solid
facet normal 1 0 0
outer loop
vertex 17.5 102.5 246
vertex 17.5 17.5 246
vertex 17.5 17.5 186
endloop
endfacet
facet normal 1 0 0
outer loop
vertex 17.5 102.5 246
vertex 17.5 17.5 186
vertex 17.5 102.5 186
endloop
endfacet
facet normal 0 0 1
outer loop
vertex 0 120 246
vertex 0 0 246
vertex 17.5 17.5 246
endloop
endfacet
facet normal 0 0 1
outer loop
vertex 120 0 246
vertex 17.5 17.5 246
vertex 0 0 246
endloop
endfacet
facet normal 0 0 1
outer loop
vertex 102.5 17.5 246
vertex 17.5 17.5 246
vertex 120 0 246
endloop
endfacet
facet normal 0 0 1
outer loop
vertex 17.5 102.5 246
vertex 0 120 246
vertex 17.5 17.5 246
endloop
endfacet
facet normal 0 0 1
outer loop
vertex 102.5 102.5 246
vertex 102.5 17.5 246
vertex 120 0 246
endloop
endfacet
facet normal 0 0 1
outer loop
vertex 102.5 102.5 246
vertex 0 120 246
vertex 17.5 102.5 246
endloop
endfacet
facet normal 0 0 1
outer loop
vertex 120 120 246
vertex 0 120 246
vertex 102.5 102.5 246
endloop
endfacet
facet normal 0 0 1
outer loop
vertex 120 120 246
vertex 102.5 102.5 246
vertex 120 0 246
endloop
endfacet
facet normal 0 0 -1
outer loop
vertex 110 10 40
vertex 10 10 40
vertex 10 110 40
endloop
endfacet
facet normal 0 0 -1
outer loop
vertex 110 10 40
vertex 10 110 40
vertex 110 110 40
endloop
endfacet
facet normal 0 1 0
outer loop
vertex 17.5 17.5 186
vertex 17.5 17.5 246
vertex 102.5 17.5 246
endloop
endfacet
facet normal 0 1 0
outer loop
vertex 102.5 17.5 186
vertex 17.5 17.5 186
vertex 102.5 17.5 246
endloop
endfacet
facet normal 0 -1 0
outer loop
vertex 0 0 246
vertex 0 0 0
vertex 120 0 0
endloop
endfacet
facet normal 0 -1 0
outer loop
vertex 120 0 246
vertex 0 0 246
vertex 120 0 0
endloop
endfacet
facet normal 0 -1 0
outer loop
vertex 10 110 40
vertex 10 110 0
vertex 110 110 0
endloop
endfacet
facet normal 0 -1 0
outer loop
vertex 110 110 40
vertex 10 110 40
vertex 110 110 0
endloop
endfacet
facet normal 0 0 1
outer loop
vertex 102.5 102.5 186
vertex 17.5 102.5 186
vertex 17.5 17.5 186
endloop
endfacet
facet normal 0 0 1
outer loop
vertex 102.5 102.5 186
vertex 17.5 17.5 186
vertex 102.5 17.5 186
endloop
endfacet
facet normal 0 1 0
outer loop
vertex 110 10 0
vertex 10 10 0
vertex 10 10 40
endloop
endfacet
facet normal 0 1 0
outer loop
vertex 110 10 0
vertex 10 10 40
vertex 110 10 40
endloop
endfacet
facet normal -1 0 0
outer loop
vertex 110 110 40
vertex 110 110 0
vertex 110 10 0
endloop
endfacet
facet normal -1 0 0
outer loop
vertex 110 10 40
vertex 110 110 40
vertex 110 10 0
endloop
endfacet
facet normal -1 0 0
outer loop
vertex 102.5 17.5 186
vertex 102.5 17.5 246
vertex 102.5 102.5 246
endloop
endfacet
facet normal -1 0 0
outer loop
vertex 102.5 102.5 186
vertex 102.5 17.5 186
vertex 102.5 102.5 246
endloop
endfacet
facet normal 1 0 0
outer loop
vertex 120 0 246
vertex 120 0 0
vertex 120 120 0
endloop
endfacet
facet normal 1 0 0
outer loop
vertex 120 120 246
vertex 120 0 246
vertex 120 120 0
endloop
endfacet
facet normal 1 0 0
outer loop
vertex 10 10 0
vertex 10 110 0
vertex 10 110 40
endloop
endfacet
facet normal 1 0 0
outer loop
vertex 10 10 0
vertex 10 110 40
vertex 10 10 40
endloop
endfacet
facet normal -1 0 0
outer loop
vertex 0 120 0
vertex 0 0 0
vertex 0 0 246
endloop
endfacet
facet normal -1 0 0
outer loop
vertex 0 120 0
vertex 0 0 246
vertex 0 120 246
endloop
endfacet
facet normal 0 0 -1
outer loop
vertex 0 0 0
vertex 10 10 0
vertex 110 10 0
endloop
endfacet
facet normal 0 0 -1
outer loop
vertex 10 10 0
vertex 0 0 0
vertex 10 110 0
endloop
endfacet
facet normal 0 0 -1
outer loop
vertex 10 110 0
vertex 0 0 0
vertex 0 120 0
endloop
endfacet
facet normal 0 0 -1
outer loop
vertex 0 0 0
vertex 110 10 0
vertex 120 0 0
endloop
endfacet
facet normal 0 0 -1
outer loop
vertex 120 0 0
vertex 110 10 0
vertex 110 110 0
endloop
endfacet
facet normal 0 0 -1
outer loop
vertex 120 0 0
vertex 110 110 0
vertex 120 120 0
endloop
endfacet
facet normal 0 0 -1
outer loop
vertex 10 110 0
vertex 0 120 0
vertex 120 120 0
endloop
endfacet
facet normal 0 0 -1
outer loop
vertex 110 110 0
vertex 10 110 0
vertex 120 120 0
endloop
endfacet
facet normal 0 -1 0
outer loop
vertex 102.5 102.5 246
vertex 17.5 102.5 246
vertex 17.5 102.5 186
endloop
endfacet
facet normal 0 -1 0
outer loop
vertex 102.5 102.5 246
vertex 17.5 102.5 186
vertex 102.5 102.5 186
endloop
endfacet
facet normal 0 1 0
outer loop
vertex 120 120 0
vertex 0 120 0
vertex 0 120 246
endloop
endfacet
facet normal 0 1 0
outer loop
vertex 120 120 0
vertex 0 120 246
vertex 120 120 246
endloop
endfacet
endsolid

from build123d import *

# Parameters (mm, degrees)
F0_W     = 120
F0_H     = 120
F1_DEPTH = 246
F2_W     = 100
F2_H     = 100
F3_DEPTH = 40
F4_W     = 85
F4_H     = 85
F5_DEPTH = 60


with BuildPart() as f1:
    # F0 (on Top) → F1 (new body)
    with BuildSketch(Plane.XY):
        with Locations((60, 60)):
            Rectangle(F0_W, F0_H)
    extrude(amount=F1_DEPTH)

    # F2 (on face) → F3 (cut)
    with BuildSketch(Plane(origin=(0, 0, 0), x_dir=(1, 0, 0), z_dir=(0, 0, -1))):
        with Locations((60, -60)):
            Rectangle(F2_W, F2_H)
    extrude(amount=-F3_DEPTH, mode=Mode.SUBTRACT)

    # F4 (on face) → F5 (cut)
    with BuildSketch(Plane.XY.offset(246)):
        with Locations((60, 60)):
            Rectangle(F4_W, F4_H)
    extrude(amount=-F5_DEPTH, mode=Mode.SUBTRACT)


solid = f1.part
